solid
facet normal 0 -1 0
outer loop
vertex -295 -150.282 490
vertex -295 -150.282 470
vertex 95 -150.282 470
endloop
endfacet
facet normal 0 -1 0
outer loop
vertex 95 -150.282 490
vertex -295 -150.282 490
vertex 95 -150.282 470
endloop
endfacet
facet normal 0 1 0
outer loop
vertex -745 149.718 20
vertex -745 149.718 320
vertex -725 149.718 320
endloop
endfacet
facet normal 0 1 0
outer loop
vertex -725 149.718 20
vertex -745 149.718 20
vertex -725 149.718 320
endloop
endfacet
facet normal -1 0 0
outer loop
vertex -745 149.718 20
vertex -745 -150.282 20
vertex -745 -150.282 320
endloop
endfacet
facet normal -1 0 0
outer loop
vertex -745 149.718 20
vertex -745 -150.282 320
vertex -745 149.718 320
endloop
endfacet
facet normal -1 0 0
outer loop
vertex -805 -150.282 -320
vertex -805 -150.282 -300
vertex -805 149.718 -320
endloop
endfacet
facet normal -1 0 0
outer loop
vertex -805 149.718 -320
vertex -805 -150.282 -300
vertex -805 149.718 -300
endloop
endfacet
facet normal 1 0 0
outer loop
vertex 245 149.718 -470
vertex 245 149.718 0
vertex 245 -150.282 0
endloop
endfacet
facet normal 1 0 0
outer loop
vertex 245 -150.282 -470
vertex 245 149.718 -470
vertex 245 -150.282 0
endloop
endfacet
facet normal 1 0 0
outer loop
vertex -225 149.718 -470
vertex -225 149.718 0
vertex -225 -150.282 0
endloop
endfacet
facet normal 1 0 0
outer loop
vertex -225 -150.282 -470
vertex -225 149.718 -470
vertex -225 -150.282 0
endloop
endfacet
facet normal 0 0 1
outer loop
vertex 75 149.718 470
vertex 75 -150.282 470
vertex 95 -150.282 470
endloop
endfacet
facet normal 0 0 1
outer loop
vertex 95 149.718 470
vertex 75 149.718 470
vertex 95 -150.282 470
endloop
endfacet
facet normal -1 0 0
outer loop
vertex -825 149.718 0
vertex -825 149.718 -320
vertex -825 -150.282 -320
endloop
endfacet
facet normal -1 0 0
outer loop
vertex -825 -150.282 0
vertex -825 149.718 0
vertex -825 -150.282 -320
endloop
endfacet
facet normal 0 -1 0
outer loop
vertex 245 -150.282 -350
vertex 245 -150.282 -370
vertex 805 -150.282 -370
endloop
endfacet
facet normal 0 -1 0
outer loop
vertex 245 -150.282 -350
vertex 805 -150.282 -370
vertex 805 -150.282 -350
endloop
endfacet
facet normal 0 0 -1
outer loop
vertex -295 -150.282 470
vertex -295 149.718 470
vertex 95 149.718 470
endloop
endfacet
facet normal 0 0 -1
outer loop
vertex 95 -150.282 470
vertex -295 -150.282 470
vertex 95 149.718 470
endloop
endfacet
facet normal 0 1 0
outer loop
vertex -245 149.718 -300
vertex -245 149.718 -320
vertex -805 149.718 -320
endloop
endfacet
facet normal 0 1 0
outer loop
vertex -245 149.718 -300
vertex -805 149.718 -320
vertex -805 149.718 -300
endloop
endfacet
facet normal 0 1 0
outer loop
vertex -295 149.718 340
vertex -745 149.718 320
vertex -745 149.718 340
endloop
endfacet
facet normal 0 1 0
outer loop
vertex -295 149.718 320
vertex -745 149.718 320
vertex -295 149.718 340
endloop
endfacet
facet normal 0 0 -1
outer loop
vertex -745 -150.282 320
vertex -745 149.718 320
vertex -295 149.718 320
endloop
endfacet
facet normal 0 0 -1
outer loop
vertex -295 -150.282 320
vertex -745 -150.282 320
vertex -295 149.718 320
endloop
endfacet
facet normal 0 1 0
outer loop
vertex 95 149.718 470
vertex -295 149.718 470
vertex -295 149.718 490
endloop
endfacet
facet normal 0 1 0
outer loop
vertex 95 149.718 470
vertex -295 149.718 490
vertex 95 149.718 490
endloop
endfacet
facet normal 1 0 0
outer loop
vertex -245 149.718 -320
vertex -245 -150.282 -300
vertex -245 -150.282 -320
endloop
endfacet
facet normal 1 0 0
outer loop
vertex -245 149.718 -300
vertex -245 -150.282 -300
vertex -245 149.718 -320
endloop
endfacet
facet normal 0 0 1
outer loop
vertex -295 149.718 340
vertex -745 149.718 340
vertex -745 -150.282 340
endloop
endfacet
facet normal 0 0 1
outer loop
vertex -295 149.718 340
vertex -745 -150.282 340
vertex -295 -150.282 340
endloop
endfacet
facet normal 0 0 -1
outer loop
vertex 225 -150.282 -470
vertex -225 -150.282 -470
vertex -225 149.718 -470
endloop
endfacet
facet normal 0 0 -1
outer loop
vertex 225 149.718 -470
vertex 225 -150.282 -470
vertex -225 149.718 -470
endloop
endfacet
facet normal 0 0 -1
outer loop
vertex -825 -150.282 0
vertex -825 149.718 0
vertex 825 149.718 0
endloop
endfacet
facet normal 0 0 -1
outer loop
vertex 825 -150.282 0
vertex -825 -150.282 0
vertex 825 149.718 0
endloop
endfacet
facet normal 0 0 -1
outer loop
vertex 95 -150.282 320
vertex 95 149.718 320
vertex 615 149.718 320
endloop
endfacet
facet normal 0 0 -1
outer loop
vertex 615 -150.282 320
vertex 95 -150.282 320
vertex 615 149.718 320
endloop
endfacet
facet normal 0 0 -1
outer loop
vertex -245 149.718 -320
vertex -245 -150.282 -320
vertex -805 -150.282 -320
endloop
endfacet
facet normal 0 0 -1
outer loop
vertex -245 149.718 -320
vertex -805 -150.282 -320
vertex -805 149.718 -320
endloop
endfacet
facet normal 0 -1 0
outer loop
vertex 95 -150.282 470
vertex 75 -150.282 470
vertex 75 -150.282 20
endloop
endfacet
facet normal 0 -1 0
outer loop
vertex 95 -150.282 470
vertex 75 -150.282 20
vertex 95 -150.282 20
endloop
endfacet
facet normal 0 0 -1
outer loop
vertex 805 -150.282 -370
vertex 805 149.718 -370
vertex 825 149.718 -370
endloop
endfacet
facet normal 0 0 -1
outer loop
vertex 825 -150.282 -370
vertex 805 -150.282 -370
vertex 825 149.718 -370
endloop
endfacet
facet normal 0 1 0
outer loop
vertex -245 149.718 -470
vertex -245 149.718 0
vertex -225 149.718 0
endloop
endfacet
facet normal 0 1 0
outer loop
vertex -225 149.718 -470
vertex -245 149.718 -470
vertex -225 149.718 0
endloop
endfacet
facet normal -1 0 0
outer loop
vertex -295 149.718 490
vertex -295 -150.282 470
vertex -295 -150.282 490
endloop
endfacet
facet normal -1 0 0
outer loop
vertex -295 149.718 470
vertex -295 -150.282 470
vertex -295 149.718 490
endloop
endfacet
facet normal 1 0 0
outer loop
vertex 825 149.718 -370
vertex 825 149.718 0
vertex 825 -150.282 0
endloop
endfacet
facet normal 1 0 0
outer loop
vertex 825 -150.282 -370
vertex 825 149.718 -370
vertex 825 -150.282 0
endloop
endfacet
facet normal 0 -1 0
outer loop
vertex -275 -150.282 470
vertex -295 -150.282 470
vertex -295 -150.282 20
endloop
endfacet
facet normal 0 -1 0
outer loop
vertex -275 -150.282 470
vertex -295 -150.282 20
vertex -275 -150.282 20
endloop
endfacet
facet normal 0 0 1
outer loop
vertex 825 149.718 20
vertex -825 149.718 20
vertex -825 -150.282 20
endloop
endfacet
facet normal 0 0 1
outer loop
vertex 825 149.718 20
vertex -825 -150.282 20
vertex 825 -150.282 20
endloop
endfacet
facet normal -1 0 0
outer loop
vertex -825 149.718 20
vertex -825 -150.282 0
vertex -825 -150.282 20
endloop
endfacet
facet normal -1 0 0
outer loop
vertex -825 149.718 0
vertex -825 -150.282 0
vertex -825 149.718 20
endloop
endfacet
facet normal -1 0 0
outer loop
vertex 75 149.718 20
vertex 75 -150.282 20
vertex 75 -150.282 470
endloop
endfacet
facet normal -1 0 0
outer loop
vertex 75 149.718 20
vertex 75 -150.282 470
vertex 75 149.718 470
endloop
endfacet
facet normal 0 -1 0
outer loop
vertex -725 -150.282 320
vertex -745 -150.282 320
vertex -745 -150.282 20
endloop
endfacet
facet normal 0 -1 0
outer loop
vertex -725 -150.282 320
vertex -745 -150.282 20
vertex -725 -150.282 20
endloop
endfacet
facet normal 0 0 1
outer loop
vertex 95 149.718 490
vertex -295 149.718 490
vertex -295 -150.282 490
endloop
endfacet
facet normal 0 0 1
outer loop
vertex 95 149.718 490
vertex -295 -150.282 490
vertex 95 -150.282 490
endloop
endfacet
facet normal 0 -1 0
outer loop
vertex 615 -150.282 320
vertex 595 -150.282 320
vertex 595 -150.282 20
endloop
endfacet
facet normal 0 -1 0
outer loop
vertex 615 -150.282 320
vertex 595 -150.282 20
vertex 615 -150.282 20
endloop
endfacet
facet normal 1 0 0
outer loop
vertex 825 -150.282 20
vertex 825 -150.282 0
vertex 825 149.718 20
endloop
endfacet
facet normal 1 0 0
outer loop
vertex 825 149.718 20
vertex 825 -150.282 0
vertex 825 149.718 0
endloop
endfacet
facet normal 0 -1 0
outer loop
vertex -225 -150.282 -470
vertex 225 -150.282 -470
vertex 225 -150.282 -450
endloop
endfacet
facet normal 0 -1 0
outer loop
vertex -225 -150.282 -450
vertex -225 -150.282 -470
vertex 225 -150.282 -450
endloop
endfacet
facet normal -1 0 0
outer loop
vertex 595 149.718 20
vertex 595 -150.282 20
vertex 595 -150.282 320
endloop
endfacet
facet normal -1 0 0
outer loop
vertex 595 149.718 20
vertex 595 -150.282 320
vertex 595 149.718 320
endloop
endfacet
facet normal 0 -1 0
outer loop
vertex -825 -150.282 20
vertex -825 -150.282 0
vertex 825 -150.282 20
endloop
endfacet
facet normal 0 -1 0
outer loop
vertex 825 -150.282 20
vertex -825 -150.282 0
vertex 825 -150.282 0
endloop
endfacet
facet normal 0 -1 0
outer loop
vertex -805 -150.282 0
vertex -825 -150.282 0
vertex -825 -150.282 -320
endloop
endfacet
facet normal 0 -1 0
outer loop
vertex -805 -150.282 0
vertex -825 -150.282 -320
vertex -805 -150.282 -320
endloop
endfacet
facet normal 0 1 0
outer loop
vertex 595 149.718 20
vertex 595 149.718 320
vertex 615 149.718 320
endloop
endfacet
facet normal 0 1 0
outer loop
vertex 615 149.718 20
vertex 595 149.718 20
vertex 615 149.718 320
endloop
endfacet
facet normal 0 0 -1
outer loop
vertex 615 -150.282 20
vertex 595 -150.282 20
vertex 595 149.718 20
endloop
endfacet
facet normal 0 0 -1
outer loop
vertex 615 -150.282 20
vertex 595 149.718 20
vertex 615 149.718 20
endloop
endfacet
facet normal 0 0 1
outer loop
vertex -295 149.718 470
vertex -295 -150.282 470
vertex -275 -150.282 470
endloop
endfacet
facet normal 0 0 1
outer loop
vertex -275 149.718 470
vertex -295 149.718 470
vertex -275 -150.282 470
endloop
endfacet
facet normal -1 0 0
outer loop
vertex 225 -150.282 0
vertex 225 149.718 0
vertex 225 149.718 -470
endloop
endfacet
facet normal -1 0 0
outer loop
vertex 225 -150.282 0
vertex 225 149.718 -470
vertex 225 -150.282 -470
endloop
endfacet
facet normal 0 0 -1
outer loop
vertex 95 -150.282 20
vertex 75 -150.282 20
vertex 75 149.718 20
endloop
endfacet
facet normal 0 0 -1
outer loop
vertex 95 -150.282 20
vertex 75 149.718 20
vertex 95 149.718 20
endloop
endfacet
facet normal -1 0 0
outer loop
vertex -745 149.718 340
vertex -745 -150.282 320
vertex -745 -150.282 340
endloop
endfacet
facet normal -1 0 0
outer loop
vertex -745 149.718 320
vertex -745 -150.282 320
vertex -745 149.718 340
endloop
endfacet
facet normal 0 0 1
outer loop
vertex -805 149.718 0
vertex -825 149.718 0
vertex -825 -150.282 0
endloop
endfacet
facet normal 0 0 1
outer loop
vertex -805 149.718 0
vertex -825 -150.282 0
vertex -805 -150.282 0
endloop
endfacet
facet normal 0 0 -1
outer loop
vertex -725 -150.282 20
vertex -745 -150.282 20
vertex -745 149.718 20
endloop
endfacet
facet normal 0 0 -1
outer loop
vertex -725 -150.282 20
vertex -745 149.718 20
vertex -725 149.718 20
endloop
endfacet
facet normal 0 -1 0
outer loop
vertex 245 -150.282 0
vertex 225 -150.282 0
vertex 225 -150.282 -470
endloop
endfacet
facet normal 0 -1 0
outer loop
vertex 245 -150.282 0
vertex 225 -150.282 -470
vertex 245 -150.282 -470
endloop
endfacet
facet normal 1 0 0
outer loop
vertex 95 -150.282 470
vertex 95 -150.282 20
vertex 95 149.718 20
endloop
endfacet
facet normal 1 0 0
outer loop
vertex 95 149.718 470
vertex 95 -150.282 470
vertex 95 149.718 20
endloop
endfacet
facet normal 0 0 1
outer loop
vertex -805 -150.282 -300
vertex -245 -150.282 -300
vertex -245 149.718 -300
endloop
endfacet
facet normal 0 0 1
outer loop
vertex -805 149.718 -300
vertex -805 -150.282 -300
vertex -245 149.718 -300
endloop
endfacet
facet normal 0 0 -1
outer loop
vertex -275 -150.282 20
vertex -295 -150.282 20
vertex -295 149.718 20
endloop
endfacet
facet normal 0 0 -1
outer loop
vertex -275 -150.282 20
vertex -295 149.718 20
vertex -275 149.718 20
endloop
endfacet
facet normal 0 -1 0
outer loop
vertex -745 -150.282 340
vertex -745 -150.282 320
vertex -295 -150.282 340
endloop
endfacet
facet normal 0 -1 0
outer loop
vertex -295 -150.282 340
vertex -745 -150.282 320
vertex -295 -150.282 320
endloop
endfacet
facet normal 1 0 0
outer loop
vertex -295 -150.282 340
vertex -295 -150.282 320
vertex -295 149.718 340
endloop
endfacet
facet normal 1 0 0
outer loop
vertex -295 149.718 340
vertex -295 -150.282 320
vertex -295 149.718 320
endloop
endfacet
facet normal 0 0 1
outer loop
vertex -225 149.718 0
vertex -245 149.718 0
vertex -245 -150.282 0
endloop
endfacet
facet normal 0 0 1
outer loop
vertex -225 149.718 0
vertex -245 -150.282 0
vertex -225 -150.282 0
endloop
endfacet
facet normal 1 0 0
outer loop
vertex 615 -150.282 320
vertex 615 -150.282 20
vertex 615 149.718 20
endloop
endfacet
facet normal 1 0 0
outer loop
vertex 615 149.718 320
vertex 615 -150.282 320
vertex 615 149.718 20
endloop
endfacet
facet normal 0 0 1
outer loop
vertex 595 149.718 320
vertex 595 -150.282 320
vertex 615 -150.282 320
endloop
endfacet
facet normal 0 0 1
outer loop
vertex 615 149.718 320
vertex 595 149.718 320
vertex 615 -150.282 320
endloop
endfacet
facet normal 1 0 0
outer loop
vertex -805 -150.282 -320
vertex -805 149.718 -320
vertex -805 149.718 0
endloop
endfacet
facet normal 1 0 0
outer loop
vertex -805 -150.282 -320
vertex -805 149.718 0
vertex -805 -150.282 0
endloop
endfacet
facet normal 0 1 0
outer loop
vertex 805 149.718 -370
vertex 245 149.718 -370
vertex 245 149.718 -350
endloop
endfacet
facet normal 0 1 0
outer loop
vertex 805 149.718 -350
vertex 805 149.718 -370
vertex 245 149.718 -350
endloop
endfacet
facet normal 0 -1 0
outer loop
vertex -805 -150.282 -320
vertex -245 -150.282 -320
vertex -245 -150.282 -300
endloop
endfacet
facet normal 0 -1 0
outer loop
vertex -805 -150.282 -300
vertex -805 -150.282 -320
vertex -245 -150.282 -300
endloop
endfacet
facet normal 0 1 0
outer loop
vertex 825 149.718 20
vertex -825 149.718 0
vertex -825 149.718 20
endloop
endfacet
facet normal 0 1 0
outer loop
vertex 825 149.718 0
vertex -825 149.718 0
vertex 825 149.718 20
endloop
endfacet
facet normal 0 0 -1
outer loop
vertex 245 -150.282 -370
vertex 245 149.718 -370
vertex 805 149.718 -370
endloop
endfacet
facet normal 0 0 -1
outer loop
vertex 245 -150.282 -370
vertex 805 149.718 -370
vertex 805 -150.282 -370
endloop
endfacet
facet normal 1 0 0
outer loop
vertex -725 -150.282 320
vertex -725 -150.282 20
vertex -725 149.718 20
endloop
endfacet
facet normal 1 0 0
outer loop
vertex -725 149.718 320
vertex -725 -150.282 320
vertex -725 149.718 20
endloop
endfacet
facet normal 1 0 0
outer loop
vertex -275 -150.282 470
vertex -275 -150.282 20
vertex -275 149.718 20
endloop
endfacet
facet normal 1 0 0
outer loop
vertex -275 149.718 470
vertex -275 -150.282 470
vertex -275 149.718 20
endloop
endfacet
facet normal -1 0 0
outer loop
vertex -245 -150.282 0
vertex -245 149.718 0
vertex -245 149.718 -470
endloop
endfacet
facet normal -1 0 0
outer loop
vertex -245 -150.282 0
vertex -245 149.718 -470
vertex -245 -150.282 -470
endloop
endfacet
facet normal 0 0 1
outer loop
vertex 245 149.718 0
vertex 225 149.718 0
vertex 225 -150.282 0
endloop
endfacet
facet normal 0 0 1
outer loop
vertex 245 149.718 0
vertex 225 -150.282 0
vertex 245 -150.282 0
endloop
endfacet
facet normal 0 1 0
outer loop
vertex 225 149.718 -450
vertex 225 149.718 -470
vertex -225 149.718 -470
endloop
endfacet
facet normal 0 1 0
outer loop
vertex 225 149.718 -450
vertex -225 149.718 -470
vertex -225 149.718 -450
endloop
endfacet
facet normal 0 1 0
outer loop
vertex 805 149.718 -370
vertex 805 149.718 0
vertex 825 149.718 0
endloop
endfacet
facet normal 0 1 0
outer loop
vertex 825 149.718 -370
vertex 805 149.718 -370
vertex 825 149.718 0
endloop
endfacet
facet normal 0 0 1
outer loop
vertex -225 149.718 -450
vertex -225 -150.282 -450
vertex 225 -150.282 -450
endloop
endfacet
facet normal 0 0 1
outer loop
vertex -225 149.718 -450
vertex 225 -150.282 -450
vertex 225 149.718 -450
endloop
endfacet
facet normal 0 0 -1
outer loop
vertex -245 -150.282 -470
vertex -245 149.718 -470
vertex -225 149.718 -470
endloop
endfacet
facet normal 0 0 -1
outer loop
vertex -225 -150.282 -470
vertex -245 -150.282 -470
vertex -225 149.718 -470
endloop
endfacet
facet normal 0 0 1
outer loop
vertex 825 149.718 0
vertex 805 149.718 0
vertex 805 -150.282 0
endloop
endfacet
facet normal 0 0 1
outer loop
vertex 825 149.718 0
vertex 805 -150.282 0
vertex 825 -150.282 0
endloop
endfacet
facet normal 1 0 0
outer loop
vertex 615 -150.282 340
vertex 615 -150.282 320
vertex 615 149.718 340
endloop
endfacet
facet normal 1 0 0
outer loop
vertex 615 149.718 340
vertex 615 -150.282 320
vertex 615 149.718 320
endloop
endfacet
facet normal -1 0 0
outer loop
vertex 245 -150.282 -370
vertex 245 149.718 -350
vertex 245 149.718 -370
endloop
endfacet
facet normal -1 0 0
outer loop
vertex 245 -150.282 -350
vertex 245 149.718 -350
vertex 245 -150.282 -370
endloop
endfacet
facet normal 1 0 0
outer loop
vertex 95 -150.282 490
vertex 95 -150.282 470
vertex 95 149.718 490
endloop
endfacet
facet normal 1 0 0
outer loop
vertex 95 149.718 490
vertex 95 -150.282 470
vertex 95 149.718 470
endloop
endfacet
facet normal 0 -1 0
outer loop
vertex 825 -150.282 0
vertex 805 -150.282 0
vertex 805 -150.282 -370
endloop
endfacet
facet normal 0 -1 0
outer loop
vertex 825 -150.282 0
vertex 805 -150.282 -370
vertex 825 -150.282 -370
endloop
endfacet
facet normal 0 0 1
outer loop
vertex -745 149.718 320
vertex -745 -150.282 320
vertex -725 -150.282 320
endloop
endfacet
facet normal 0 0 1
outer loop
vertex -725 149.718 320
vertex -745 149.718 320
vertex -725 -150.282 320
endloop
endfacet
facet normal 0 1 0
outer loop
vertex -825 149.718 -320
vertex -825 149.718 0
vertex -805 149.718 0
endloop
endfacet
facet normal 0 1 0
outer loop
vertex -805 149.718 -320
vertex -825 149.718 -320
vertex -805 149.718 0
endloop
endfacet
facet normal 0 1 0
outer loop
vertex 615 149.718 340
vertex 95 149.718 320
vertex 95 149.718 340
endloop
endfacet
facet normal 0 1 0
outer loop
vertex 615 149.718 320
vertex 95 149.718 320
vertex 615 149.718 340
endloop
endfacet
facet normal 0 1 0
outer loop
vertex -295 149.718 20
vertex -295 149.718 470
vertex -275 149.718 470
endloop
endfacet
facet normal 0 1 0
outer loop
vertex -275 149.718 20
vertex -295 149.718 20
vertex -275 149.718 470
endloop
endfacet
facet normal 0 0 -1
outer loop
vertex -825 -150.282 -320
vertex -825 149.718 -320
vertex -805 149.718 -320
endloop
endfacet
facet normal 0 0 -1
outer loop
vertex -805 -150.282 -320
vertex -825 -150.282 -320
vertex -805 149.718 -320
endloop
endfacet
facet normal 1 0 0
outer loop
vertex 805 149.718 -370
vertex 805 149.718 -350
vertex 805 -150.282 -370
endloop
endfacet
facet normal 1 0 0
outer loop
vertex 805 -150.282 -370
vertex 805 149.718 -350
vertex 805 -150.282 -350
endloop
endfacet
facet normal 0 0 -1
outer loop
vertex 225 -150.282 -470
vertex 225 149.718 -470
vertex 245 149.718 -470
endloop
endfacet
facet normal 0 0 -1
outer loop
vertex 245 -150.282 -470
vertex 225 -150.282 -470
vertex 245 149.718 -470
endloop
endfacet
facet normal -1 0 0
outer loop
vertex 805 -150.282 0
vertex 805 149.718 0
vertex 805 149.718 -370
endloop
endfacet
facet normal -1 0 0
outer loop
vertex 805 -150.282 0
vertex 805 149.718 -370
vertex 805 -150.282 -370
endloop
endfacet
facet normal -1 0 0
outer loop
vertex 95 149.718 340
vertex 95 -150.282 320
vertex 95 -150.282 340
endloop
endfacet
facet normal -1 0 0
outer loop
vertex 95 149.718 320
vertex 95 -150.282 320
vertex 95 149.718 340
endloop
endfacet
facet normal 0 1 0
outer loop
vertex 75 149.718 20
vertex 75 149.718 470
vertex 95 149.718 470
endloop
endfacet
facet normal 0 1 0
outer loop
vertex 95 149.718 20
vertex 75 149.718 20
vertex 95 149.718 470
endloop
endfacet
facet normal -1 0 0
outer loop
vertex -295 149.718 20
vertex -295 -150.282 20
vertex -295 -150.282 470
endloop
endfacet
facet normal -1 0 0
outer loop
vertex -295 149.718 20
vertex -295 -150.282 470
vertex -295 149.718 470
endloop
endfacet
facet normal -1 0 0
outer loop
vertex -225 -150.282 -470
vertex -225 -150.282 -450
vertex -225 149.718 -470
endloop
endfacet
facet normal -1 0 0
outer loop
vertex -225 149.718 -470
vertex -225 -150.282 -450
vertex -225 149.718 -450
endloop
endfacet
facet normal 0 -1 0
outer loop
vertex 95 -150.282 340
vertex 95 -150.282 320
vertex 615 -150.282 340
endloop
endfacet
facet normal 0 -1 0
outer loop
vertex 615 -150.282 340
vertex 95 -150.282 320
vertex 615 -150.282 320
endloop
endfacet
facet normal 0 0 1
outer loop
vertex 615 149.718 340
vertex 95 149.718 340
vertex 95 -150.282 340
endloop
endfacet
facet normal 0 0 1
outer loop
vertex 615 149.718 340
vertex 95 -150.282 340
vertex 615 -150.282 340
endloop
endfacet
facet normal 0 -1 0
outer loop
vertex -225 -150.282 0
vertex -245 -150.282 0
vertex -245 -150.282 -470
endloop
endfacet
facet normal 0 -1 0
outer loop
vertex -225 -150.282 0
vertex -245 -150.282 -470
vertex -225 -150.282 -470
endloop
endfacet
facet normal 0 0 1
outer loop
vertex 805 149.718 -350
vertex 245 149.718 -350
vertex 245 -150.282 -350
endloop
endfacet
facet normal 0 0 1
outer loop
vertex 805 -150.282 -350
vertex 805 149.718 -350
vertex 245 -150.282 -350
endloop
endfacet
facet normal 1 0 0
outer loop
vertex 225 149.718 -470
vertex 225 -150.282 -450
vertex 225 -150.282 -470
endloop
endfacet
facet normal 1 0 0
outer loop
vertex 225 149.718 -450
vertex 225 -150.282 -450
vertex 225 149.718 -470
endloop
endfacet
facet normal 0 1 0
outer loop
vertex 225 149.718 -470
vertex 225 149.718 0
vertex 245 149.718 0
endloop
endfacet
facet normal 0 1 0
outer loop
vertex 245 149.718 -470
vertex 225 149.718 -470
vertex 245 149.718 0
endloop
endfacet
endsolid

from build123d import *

# Parameters (mm, degrees)
F0_W      = 1650
F0_H      = 300
F1_DEPTH  = 20
F2_W      = 20
F2_H      = 300
F3_DEPTH  = 300
F4_W      = 20
F4_H      = 300
F5_DEPTH  = 450
F6_W      = 20
F6_H      = 300
F7_DEPTH  = 450
F8_W      = 20
F8_H      = 300
F9_DEPTH  = 300
F10_W     = 450
F10_H     = 300
F11_DEPTH = 20
F12_W     = 390
F12_H     = 300
F13_DEPTH = 20
F14_W     = 520
F14_H     = 300
F15_DEPTH = 20
F16_W     = 20
F16_H     = 300
F17_DEPTH = 320
F18_W     = 20
F18_H     = 300
F19_DEPTH = 470
F20_W     = 20
F20_H     = 300
F21_DEPTH = 470
F22_W     = 20
F22_H     = 300
F23_DEPTH = 370
F24_W     = 300
F24_H     = 20
F25_DEPTH = 560
F26_W     = 300
F26_H     = 20
F27_DEPTH = 450
F28_W     = 300
F28_H     = 20
F29_DEPTH = 560


with BuildPart() as f1:
    # F0 (on Top) → F1 (new body)
    with BuildSketch(Plane.XY):
        with Locations((0, -0.282021)):
            Rectangle(F0_W, F0_H)
    extrude(amount=F1_DEPTH)


with BuildPart() as f3:
    # F2 (on face) → F3 (new body)
    with BuildSketch(Plane.XY.offset(20)):
        with Locations((-735, -0.282021)):
            Rectangle(F2_W, F2_H)
    extrude(amount=F3_DEPTH)


with BuildPart() as f5:
    # F4 (on face) → F5 (new body)
    with BuildSketch(Plane.XY.offset(20)):
        with Locations((-285, -0.282021)):
            Rectangle(F4_W, F4_H)
    extrude(amount=F5_DEPTH)


with BuildPart() as f7:
    # F6 (on face) → F7 (new body)
    with BuildSketch(Plane.XY.offset(20)):
        with Locations((85, -0.282021)):
            Rectangle(F6_W, F6_H)
    extrude(amount=F7_DEPTH)


with BuildPart() as f9:
    # F8 (on face) → F9 (new body)
    with BuildSketch(Plane.XY.offset(20)):
        with Locations((605, -0.282021)):
            Rectangle(F8_W, F8_H)
    extrude(amount=F9_DEPTH)


with BuildPart() as f11:
    # F10 (on face) → F11 (new body)
    with BuildSketch(Plane.XY.offset(320)):
        with Locations((-520, -0.282021)):
            Rectangle(F10_W, F10_H)
    extrude(amount=F11_DEPTH)


with BuildPart() as f13:
    # F12 (on face) → F13 (new body)
    with BuildSketch(Plane.XY.offset(470)):
        with Locations((-100, -0.282021)):
            Rectangle(F12_W, F12_H)
    extrude(amount=F13_DEPTH)


with BuildPart() as f15:
    # F14 (on face) → F15 (new body)
    with BuildSketch(Plane.XY.offset(320)):
        with Locations((355, -0.282021)):
            Rectangle(F14_W, F14_H)
    extrude(amount=F15_DEPTH)


with BuildPart() as f17:
    # F16 (on face) → F17 (new body)
    with BuildSketch(Plane(origin=(0, 0, 0), x_dir=(1, 0, 0), z_dir=(0, 0, -1))):
        with Locations((-815, 0.282021)):
            Rectangle(F16_W, F16_H)
    extrude(amount=F17_DEPTH)


with BuildPart() as f19:
    # F18 (on face) → F19 (new body)
    with BuildSketch(Plane(origin=(0, 0, 0), x_dir=(1, 0, 0), z_dir=(0, 0, -1))):
        with Locations((-235, 0.282021)):
            Rectangle(F18_W, F18_H)
    extrude(amount=F19_DEPTH)


with BuildPart() as f21:
    # F20 (on face) → F21 (new body)
    with BuildSketch(Plane(origin=(0, 0, 0), x_dir=(1, 0, 0), z_dir=(0, 0, -1))):
        with Locations((235, 0.282021)):
            Rectangle(F20_W, F20_H)
    extrude(amount=F21_DEPTH)


with BuildPart() as f23:
    # F22 (on face) → F23 (new body)
    with BuildSketch(Plane(origin=(0, 0, 0), x_dir=(1, 0, 0), z_dir=(0, 0, -1))):
        with Locations((815, 0.282021)):
            Rectangle(F22_W, F22_H)
    extrude(amount=F23_DEPTH)


with BuildPart() as f25:
    # F24 (on face) → F25 (new body, through all)
    with BuildSketch(Plane.YZ.offset(-805)):
        with Locations((-0.282021, -310)):
            Rectangle(F24_W, F24_H)
    extrude(amount=F25_DEPTH)


with BuildPart() as f27:
    # F26 (on face) → F27 (new body, through all)
    with BuildSketch(Plane.YZ.offset(-225)):
        with Locations((-0.282021, -460)):
            Rectangle(F26_W, F26_H)
    extrude(amount=F27_DEPTH)


with BuildPart() as f29:
    # F28 (on face) → F29 (new body, through all)
    with BuildSketch(Plane(origin=(805, 0, 0), x_dir=(0, -1, 0), z_dir=(-1, 0, 0))):
        with Locations((0.282021, -360)):
            Rectangle(F28_W, F28_H)
    extrude(amount=F29_DEPTH)


solid = Compound([f1.part, f3.part, f5.part, f7.part, f9.part, f11.part, f13.part, f15.part, f17.part, f19.part, f21.part, f23.part, f25.part, f27.part, f29.part])
